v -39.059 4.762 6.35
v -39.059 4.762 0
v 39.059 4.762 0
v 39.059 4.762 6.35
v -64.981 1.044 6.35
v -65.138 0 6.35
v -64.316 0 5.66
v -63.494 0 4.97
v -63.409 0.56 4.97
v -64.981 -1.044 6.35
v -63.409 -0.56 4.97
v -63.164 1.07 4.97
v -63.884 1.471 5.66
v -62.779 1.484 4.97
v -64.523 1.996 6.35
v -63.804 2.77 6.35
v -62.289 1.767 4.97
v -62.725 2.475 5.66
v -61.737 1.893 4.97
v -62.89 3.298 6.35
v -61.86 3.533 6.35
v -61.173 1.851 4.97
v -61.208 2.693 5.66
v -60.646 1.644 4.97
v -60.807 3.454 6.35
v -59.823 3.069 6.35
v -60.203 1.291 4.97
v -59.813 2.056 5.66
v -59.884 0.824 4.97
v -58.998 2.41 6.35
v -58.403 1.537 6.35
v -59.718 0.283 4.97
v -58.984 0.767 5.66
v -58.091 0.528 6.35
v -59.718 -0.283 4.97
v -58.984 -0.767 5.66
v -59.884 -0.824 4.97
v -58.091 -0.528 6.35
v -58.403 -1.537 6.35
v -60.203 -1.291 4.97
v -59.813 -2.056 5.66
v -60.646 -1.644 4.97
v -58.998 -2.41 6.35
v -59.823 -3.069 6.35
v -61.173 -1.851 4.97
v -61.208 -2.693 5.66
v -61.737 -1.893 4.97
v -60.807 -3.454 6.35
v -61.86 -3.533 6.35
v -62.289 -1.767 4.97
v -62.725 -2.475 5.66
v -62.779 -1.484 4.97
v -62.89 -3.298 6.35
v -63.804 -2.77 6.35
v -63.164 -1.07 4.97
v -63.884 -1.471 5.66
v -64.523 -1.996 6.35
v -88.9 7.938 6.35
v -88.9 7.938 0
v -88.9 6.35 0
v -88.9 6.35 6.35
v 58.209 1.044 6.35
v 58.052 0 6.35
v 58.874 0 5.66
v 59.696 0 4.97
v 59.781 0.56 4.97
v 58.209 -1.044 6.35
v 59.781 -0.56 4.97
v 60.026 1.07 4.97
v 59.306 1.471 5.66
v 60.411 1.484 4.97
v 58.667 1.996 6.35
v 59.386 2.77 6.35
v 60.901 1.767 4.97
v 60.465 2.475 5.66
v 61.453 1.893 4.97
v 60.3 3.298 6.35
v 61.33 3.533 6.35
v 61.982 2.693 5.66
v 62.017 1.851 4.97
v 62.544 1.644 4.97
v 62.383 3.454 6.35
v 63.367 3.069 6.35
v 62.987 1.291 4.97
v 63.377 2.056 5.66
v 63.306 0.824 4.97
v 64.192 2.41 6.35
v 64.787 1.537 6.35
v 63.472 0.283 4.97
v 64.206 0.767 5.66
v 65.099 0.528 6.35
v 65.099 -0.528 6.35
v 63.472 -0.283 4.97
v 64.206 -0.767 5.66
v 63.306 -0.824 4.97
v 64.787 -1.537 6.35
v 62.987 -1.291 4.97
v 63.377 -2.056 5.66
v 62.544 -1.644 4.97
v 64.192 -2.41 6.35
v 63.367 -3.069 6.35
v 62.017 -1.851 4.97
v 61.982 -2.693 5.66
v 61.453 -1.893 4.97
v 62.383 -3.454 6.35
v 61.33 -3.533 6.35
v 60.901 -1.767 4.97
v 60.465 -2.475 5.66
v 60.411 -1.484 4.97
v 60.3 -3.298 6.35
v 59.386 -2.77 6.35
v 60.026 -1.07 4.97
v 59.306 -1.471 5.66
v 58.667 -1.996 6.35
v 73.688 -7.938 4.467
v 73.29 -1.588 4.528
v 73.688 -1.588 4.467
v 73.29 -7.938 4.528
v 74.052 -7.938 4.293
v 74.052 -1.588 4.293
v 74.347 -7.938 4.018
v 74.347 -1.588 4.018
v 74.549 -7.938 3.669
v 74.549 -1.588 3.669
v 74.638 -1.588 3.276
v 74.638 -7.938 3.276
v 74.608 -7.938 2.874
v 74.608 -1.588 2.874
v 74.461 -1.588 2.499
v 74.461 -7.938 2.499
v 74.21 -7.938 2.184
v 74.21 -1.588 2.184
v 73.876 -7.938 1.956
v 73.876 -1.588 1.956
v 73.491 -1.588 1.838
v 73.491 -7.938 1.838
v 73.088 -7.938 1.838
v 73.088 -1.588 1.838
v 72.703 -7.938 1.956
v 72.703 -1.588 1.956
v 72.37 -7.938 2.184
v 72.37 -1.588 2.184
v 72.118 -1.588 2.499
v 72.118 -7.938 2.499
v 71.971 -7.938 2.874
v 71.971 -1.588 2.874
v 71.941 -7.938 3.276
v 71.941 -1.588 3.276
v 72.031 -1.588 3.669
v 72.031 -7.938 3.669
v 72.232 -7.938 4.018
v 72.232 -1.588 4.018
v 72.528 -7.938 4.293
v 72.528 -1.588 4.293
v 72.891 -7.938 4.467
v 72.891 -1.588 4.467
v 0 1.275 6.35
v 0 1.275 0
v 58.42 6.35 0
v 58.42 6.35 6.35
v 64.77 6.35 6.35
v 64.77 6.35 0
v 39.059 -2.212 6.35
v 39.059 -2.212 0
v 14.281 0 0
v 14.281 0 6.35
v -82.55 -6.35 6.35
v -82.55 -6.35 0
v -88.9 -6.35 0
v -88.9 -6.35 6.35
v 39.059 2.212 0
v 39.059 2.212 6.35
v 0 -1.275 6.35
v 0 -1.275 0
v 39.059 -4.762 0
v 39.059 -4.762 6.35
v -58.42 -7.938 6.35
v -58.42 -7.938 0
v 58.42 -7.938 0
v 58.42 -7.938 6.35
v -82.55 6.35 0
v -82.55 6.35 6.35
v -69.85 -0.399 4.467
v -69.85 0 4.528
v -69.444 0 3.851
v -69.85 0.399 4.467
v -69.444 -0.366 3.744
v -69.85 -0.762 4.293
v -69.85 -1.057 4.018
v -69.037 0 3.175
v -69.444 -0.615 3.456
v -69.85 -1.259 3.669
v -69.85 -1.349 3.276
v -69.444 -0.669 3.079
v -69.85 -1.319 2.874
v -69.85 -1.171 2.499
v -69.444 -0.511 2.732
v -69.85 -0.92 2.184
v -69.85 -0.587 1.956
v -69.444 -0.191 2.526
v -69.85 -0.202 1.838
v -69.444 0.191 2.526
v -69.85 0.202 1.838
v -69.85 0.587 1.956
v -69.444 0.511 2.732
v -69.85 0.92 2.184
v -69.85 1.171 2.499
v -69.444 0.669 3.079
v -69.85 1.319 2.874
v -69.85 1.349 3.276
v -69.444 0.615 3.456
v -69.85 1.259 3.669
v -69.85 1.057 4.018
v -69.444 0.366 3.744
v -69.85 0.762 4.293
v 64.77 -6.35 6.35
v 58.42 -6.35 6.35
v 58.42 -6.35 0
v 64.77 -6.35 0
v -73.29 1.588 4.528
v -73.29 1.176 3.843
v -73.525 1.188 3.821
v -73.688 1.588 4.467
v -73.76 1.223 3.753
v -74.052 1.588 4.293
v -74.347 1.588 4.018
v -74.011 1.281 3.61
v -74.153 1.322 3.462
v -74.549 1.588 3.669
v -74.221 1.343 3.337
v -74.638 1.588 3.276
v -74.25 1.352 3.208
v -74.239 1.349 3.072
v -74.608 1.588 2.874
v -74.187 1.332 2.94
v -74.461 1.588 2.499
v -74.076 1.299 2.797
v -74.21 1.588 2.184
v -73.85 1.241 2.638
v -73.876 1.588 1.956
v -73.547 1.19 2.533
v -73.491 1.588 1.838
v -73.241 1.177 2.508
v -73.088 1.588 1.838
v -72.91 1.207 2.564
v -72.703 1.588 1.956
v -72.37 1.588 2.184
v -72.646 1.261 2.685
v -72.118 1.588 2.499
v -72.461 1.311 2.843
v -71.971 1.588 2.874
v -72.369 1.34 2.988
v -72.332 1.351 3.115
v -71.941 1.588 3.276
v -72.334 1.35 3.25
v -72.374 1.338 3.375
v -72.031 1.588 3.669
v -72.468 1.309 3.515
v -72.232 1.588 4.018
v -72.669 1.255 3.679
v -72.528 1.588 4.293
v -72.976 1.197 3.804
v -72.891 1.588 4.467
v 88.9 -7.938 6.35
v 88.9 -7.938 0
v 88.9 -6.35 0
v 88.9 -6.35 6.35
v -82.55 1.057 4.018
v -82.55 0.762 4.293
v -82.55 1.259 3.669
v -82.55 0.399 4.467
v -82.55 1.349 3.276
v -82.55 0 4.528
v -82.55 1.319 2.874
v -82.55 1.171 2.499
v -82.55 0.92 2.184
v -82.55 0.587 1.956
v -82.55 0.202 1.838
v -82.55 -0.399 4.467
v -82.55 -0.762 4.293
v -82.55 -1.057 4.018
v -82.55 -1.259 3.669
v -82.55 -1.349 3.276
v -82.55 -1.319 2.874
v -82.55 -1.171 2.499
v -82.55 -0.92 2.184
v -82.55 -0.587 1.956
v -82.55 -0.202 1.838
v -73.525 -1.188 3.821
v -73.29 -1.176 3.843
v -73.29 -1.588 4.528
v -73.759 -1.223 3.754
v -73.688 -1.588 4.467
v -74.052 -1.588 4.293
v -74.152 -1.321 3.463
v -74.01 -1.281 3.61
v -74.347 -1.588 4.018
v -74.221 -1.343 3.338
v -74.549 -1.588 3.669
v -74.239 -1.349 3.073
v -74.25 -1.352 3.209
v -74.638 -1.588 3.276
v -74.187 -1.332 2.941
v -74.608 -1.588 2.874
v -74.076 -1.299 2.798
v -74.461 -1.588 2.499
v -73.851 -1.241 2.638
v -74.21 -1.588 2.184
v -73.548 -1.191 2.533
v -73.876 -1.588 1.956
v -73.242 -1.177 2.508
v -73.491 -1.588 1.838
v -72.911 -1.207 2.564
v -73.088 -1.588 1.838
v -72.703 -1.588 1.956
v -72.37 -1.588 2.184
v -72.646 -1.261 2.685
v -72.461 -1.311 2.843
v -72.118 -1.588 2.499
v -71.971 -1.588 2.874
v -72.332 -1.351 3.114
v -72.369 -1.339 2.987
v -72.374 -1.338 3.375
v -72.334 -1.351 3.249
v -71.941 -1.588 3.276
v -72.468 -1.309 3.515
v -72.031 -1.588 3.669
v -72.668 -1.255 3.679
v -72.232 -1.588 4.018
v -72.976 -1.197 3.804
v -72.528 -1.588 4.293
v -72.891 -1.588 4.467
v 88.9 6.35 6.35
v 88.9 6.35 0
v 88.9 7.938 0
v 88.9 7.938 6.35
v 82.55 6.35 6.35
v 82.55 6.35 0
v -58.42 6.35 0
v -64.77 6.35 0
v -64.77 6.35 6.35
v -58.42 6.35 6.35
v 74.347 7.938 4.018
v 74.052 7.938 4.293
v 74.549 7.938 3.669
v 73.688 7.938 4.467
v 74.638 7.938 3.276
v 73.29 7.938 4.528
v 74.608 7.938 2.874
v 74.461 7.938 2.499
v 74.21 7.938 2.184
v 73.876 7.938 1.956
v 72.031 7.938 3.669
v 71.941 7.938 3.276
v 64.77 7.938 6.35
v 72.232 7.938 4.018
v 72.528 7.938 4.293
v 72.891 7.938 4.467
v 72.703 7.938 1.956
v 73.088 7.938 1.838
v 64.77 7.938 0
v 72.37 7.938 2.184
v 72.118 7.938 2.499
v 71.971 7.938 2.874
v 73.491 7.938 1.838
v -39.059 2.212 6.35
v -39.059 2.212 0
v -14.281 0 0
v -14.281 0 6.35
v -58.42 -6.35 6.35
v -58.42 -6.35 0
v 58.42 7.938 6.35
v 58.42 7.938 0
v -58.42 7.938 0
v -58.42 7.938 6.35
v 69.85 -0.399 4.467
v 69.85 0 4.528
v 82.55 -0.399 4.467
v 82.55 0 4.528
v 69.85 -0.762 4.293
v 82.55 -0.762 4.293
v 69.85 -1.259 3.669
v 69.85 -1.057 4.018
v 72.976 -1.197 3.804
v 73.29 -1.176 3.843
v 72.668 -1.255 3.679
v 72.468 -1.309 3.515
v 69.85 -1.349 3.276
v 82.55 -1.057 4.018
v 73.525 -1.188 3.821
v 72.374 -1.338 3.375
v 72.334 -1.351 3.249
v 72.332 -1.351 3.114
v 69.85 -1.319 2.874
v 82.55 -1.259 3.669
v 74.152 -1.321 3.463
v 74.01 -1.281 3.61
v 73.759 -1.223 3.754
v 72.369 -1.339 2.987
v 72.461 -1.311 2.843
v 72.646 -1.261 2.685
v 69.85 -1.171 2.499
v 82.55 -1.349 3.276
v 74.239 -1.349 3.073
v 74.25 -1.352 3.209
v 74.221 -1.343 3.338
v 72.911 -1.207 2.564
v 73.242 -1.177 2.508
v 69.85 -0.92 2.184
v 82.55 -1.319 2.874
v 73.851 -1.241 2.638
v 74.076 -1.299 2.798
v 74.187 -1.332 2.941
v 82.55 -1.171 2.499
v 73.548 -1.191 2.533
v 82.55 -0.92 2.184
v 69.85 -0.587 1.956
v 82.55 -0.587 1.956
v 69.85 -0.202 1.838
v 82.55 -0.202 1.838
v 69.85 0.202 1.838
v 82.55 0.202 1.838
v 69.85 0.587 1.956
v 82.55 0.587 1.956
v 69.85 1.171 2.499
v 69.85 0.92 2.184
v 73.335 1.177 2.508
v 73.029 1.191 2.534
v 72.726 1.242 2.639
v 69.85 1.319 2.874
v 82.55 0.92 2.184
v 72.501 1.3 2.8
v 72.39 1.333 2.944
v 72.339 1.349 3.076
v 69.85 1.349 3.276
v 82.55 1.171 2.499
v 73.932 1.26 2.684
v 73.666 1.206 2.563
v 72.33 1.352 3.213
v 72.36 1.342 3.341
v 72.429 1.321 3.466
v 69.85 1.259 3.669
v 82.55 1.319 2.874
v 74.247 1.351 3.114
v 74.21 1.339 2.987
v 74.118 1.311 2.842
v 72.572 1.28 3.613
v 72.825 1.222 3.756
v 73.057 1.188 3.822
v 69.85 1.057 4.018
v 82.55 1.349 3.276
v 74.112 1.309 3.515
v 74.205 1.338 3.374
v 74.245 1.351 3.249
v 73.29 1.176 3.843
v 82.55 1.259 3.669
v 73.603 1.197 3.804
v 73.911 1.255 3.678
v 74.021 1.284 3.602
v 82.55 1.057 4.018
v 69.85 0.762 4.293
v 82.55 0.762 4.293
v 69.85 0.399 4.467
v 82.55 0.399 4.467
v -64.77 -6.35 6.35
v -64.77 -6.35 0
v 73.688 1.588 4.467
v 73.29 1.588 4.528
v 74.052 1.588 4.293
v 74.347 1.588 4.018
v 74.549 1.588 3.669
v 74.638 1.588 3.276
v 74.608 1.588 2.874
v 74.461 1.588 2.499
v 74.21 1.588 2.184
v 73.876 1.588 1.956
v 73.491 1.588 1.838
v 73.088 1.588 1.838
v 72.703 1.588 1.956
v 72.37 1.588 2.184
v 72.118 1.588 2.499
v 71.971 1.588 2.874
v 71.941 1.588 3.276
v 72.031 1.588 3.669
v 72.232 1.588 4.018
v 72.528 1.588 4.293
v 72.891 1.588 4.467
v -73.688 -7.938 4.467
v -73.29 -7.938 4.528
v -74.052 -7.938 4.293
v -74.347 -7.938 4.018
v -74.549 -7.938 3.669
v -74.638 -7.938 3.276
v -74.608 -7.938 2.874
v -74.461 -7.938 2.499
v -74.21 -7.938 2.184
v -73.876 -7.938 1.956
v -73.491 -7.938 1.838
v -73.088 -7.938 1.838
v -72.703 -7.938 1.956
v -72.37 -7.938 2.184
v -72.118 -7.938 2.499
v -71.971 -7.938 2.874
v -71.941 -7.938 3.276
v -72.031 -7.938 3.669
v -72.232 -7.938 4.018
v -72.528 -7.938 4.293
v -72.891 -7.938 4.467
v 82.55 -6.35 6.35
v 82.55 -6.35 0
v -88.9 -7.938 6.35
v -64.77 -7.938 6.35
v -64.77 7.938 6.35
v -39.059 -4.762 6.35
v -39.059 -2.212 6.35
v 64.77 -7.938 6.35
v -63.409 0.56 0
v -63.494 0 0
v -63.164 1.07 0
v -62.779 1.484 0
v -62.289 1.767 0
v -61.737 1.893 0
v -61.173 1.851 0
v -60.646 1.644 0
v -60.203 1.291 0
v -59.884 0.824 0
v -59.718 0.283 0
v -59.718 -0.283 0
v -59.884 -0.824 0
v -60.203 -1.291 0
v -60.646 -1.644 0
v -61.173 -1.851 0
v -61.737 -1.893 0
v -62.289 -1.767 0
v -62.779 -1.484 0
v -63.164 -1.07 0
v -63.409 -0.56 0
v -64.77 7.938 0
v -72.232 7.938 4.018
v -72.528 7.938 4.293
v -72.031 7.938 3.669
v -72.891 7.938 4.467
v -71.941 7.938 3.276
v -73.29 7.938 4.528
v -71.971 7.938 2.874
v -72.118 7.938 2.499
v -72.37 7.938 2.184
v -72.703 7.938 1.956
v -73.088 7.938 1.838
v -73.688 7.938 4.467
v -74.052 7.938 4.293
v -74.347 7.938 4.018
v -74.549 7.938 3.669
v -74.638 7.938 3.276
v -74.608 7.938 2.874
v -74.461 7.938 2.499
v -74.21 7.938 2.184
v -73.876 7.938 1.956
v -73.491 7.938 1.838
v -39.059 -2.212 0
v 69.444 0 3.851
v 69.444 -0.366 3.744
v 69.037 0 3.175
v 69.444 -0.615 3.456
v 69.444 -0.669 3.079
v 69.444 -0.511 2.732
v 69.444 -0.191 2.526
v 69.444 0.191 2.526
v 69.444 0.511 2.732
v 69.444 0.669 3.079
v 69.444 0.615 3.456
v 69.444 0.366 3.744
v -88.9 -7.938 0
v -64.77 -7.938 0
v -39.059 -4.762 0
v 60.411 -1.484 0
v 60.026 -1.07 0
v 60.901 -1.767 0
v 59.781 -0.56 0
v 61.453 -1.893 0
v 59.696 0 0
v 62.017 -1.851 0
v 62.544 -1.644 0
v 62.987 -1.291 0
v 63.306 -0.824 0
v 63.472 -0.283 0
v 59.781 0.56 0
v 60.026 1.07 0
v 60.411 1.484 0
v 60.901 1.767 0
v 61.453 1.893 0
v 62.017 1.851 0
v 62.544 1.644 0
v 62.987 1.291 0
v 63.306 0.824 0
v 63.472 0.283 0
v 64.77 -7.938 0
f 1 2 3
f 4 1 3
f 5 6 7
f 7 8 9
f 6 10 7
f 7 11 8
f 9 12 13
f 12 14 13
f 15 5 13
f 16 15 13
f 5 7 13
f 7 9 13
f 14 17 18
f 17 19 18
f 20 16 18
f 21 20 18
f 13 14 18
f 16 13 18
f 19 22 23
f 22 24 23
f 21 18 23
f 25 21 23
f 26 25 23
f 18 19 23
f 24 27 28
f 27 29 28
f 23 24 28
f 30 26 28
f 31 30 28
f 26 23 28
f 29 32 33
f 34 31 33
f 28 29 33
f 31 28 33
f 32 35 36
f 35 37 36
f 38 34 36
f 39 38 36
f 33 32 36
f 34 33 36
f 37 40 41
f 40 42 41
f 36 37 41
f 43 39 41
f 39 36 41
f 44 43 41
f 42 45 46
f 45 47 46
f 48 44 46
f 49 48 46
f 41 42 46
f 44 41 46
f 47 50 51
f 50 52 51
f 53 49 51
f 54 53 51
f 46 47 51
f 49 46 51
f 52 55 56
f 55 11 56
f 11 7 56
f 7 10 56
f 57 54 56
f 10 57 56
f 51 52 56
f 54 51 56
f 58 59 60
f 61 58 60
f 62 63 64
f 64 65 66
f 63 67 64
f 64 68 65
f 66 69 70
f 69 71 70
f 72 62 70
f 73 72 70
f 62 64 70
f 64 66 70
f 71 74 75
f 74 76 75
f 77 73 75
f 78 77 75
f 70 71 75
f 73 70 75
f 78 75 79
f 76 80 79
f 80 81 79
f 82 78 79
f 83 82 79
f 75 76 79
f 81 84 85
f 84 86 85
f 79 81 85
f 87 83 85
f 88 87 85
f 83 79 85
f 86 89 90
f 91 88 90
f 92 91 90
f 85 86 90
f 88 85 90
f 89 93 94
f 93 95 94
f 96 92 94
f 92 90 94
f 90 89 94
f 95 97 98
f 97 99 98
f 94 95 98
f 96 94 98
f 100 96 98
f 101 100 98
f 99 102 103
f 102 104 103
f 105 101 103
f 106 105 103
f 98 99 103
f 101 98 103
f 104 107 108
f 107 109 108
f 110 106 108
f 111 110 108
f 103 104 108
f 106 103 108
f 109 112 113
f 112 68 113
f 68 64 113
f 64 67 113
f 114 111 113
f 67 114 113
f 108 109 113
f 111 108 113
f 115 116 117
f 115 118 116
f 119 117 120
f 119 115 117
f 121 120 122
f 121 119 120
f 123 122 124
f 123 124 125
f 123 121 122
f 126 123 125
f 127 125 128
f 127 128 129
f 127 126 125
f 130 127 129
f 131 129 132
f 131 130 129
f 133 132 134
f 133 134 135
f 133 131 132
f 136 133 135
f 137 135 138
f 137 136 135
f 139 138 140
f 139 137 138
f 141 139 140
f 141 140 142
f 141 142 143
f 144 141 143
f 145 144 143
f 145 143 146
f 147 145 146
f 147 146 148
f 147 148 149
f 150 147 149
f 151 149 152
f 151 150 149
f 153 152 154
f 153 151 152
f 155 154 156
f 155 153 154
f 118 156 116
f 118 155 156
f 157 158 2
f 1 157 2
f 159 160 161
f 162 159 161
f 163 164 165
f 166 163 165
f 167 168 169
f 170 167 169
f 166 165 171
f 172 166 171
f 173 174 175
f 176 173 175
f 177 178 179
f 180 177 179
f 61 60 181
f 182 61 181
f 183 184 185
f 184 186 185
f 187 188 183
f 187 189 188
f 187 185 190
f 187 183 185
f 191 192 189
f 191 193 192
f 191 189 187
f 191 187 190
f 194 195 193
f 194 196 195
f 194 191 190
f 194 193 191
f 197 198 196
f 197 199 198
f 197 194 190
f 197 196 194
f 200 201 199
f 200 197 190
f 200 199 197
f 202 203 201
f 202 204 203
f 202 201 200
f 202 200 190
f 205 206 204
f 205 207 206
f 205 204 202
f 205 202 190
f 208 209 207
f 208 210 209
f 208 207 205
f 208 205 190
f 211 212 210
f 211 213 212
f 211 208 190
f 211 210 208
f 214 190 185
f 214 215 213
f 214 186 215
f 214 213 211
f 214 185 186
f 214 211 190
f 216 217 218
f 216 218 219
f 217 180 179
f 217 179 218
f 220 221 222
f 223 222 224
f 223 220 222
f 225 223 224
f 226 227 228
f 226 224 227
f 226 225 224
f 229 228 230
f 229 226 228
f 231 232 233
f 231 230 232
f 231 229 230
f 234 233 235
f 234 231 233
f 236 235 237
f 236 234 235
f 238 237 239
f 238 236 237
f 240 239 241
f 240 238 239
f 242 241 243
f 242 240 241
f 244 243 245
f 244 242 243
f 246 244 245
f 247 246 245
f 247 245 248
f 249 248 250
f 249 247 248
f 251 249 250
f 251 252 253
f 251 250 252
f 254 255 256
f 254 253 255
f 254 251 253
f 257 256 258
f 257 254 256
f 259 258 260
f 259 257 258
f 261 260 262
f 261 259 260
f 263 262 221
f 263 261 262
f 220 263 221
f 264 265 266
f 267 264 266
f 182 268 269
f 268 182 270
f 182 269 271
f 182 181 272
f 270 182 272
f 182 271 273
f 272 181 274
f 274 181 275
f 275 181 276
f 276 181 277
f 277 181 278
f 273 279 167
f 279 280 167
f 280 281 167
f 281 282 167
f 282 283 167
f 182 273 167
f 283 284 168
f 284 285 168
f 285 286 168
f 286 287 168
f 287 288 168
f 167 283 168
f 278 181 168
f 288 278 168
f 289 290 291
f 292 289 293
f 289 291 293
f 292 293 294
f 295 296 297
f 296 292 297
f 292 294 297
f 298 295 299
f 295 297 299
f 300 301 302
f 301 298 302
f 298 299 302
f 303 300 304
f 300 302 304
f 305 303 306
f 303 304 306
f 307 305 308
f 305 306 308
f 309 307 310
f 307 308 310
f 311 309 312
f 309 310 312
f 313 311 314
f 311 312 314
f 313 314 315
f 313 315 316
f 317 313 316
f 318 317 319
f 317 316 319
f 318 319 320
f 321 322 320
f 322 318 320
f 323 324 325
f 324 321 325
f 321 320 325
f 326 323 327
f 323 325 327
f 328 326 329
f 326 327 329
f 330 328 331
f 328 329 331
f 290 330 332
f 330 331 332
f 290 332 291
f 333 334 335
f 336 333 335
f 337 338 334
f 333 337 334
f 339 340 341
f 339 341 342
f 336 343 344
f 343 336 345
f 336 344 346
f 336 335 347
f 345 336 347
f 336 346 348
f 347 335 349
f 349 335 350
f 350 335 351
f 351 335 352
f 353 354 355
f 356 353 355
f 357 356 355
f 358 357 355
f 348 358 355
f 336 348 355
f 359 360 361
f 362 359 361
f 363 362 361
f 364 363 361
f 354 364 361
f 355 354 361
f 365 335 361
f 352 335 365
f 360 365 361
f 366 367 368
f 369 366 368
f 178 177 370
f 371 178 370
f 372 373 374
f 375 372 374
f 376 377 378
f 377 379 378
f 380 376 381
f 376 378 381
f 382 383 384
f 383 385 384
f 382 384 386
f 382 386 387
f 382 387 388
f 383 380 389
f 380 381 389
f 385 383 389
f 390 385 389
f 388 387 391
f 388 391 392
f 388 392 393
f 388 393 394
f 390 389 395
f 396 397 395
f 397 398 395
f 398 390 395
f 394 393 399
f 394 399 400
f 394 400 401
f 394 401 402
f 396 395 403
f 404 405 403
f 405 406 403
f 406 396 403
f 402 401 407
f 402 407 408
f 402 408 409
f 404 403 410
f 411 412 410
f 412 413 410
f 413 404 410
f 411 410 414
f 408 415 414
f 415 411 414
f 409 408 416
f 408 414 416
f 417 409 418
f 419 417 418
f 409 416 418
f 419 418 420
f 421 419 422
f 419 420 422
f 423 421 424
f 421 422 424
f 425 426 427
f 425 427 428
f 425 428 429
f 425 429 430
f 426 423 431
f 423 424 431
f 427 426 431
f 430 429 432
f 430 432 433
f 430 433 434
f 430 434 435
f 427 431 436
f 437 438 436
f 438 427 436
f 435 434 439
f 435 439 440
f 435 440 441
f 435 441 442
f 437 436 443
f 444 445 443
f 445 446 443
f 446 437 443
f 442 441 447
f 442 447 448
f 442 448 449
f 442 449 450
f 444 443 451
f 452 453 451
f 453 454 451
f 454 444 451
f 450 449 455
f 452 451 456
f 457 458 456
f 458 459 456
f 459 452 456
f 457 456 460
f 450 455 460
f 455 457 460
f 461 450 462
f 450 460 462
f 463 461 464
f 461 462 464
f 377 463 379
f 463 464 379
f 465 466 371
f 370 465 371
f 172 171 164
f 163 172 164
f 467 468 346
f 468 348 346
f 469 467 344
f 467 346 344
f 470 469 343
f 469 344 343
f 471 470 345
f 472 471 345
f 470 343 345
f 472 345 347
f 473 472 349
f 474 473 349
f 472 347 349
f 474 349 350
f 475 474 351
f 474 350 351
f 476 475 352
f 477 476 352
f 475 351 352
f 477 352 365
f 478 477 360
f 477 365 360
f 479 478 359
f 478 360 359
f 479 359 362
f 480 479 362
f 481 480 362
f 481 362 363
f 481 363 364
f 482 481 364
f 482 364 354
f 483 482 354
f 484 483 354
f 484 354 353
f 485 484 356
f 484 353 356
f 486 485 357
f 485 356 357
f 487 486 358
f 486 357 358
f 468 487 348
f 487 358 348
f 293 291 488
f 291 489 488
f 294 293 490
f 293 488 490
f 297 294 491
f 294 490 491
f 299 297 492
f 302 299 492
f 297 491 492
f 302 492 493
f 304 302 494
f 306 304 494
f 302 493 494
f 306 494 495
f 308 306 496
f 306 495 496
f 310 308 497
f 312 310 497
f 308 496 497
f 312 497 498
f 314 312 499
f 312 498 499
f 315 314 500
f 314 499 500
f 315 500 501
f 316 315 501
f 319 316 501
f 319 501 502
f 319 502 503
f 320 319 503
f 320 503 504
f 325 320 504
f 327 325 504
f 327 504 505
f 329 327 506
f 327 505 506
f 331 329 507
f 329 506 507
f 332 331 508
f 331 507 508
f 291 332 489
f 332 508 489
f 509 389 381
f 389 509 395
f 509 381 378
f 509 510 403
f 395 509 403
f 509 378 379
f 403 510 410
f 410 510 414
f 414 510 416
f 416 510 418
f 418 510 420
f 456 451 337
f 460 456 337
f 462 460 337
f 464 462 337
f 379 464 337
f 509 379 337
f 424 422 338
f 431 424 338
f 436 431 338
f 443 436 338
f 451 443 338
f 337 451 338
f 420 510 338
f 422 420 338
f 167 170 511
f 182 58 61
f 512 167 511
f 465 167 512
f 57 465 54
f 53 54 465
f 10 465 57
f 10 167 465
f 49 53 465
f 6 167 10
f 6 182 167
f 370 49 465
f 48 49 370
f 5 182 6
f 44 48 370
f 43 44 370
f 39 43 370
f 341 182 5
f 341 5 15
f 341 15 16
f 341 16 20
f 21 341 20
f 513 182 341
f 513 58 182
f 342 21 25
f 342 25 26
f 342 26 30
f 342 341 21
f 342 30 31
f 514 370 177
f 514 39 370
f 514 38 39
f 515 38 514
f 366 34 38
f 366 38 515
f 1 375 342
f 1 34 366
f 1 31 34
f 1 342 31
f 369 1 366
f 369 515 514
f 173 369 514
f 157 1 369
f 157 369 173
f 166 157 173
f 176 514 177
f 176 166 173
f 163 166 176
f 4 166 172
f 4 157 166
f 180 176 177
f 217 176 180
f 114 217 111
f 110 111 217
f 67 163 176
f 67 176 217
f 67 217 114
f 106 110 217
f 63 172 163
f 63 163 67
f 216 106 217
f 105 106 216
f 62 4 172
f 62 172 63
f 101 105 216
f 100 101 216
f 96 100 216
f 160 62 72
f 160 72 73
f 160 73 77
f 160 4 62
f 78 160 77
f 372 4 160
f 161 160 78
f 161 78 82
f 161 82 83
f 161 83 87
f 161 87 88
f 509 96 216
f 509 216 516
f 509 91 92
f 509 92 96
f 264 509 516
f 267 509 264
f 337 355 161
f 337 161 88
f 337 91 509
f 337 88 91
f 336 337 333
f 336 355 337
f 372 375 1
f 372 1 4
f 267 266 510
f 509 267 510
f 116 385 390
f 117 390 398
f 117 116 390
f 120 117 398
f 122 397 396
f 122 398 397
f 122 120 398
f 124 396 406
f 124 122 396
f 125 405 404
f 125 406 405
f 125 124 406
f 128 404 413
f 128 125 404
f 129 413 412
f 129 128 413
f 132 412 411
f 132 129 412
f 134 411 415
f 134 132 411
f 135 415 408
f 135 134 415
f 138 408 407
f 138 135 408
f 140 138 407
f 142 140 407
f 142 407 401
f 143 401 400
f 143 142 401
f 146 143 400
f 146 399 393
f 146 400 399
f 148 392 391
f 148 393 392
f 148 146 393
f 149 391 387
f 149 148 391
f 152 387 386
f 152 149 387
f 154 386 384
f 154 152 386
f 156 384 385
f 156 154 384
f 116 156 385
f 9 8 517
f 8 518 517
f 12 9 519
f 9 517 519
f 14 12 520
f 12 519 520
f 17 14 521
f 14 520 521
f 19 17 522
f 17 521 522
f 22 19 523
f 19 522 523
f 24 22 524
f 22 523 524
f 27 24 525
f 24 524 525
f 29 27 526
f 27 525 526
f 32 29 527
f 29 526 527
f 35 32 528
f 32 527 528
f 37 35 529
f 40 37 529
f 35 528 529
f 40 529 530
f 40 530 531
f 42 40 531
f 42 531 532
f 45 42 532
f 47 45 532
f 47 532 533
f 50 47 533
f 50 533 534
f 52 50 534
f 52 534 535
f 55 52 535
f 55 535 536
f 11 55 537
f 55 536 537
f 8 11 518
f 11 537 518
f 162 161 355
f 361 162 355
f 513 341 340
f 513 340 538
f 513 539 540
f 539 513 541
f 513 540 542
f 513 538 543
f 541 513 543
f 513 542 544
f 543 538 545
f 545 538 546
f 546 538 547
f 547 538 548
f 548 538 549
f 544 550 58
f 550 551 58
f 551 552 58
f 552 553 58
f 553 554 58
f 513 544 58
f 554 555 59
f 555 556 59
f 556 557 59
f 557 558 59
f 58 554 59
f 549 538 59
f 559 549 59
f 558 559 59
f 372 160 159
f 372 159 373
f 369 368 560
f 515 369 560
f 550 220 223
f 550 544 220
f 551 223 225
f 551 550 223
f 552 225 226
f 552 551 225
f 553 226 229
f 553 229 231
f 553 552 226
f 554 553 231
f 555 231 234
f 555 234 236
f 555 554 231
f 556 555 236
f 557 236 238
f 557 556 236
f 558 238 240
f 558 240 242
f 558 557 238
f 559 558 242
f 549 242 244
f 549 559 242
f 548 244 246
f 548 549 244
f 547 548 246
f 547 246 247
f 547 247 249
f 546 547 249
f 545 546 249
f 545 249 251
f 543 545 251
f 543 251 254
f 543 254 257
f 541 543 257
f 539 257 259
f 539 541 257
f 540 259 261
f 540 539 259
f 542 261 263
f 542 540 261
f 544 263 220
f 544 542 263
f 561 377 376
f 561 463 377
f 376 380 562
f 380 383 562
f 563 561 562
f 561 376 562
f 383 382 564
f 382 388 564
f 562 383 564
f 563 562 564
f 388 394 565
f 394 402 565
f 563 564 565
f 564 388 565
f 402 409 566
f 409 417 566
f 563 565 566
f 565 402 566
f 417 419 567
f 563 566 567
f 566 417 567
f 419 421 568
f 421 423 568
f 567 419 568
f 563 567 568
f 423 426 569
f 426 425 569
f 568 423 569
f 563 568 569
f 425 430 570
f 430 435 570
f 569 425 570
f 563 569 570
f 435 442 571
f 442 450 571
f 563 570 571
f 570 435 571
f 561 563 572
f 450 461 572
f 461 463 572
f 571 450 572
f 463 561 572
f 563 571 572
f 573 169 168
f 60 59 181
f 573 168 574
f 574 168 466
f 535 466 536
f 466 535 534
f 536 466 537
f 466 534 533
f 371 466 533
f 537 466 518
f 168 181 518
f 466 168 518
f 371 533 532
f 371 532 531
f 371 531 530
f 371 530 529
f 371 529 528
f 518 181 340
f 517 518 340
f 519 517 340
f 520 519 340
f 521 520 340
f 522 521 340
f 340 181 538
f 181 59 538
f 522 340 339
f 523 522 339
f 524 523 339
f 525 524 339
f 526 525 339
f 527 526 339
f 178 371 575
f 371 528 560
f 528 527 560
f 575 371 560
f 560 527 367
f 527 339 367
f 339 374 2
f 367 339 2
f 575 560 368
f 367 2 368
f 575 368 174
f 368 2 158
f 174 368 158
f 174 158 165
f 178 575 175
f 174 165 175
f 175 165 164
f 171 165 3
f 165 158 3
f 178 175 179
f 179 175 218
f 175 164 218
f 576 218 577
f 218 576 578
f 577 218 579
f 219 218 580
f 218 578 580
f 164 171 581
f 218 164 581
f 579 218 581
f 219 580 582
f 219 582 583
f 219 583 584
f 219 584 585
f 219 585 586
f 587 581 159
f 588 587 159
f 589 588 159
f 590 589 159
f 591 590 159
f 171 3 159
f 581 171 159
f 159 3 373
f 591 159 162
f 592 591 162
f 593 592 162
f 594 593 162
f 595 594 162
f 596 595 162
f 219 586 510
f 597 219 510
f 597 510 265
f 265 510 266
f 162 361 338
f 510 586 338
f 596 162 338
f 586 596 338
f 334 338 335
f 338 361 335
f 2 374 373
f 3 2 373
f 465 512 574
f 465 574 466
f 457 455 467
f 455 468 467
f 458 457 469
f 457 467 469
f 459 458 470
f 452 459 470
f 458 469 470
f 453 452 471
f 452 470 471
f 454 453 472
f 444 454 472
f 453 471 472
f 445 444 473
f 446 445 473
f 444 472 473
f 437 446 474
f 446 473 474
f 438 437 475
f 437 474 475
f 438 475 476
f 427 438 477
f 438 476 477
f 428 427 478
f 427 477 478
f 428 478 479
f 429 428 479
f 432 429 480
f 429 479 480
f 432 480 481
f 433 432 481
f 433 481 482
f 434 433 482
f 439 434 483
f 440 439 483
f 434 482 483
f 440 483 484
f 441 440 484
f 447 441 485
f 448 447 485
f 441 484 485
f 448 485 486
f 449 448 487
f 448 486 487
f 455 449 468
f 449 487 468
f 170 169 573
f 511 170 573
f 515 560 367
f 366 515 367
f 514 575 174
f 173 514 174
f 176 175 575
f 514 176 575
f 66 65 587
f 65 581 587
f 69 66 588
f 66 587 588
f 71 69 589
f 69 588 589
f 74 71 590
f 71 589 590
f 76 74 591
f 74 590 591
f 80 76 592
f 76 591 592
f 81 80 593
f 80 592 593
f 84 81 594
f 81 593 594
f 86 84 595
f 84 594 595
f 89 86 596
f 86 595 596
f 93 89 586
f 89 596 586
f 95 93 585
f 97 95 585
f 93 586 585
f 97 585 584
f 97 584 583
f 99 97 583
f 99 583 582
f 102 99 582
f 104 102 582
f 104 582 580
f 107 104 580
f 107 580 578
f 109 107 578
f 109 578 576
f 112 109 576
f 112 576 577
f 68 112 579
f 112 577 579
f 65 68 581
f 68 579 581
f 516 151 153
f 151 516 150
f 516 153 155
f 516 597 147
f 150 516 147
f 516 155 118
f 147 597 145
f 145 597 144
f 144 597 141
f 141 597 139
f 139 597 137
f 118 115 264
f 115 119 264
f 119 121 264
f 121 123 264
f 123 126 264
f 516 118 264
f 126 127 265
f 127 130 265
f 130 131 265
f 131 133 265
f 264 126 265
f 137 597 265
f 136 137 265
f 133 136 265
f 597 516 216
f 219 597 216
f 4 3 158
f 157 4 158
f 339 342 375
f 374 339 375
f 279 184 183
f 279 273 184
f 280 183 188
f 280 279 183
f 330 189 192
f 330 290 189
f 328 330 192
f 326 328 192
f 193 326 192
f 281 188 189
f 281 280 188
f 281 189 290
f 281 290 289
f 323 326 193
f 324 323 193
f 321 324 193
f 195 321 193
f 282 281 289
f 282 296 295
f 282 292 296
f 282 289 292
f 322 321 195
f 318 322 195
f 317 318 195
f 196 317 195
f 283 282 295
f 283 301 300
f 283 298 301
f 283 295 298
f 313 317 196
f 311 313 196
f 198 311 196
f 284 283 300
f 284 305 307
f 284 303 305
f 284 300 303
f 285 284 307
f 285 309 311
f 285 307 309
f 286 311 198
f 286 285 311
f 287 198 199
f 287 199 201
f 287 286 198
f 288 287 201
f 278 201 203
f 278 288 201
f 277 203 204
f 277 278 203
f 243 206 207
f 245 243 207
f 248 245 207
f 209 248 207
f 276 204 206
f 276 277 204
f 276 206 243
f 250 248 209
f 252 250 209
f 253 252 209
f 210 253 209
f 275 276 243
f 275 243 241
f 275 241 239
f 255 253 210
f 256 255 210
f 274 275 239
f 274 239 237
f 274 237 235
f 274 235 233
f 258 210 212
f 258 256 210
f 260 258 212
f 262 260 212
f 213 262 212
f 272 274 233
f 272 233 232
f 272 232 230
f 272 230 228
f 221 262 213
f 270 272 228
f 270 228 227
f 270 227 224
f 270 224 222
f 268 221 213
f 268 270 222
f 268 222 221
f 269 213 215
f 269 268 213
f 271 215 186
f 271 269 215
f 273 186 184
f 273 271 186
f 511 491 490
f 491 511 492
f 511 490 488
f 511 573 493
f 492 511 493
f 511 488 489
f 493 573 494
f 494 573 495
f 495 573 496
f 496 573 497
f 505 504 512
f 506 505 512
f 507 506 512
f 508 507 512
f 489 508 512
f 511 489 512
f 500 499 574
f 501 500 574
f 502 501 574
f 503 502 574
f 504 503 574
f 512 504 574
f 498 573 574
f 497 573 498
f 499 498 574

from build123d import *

# Parameters (mm, degrees)
BOSS_EXTRUDE1_DEPTH                               = 6.35
SKETCH7_W                                         = 6.35
SKETCH7_H                                         = 1.5875
CUT_EXTRUDE1_DEPTH                                = 90.479251261
CSK_FOR_6_FLAT_HEAD_MACHINE_SCREW_100_D           = 3.7973
CSK_FOR_6_FLAT_HEAD_MACHINE_SCREW_100_CSINK_D     = 7.0866
CSK_FOR_6_FLAT_HEAD_MACHINE_SCREW_100_CSINK_ANGLE = 100


with BuildPart() as part:
    # Sketch1 → Boss-Extrude1 (new body)
    with BuildSketch(Plane.XY):
        Polygon((-39.059416118, -2.212395735), (-39.059416118, 2.212395735), (-82.55, 6.095483582), (-82.55, -6.095483582), align=None)
        Polygon((39.059416118, -4.7625), (-39.059416118, -4.7625), (-74.619416118, -7.9375), (74.619416118, -7.9375), align=None)
        Polygon((-39.059416118, -4.7625), (-39.059416118, -2.212395735), (-82.55, -6.095483582), (-82.55, -6.35), (-85.400583882, -6.35), (-88.9, -6.662447868), (-88.9, -7.9375), (-74.619416118, -7.9375), align=None)
        Polygon((0, -1.275052132), (-14.280583882, 0), (-39.059416118, -2.212395735), (-39.059416118, -4.7625), align=None)
        Polygon((0, 1.275052132), (-39.059416118, 4.7625), (-39.059416118, 2.212395735), (-14.280583882, 0), align=None)
        Polygon((74.619416118, 7.9375), (-74.619416118, 7.9375), (-39.059416118, 4.7625), (39.059416118, 4.7625), align=None)
        Polygon((-74.619416118, 7.9375), (-88.9, 7.9375), (-88.9, 6.662447868), (-85.400583882, 6.35), (-82.55, 6.35), (-82.55, 6.095483582), (-39.059416118, 2.212395735), (-39.059416118, 4.7625), align=None)
        Polygon((39.059416118, -2.212395735), (14.280583882, 0), (0, -1.275052132), (39.059416118, -4.7625), align=None)
        Polygon((39.059416118, 2.212395735), (39.059416118, 4.7625), (0, 1.275052132), (14.280583882, 0), align=None)
        Polygon((14.280583882, 0), (0, 1.275052132), (-14.280583882, 0), (0, -1.275052132), align=None)
        Polygon((82.55, -6.095483582), (39.059416118, -2.212395735), (39.059416118, -4.7625), (74.619416118, -7.9375), (88.9, -7.9375), (88.9, -6.662447868), (85.400583882, -6.35), (82.55, -6.35), align=None)
        Polygon((88.9, 7.9375), (74.619416118, 7.9375), (39.059416118, 4.7625), (39.059416118, 2.212395735), (82.55, 6.095483582), (82.55, 6.35), (85.400583882, 6.35), (88.9, 6.662447868), align=None)
        Polygon((88.9, 6.35), (88.9, 6.662447868), (85.400583882, 6.35), align=None)
        Polygon((88.9, -6.35), (85.400583882, -6.35), (88.9, -6.662447868), align=None)
        Polygon((82.55, 6.095483582), (39.059416118, 2.212395735), (39.059416118, -2.212395735), (82.55, -6.095483582), align=None)
        Polygon((-88.9, -6.662447868), (-85.400583882, -6.35), (-88.9, -6.35), align=None)
        Polygon((-85.400583882, 6.35), (-88.9, 6.662447868), (-88.9, 6.35), align=None)
    extrude(amount=BOSS_EXTRUDE1_DEPTH)

    # Sketch4 → Tap Drill for #6-32 Tap1 (revolve, cut)
    with BuildSketch(Plane(origin=(-82.55, 0, 3.175), x_dir=(0, 0, 1), z_dir=(0, 1, 0))):
        Polygon((0, 0), (0, 13.51269403), (1.35255, 12.7), (1.35255, 0), align=None)
    tap_drill_for_6_32_tap1 = revolve(axis=Axis((-88.9, 0, 3.175), (1, 0, 0)), mode=Mode.SUBTRACT)

    # Mirror1: Tap Drill for #6-32 Tap1 across plane
    add(tap_drill_for_6_32_tap1.mirror(Plane(origin=(0, 0, 0), x_dir=(0, 0, 1), z_dir=(1, 0, 0))), mode=Mode.SUBTRACT)

    # Sketch5 → Tap Drill for #6-32 Tap2 (revolve, cut)
    with BuildSketch(Plane(origin=(-73.289583418, 7.9375, 3.175), x_dir=(0, 0, 1), z_dir=(1, 0, 0))):
        Polygon((0, 0), (0, 7.16269403), (1.35255, 6.35), (1.35255, 0), align=None)
    tap_drill_for_6_32_tap2 = revolve(axis=Axis((-73.289583418, 14.2875, 3.175), (0, -1, 0)), mode=Mode.SUBTRACT)

    # Mirror2: Tap Drill for #6-32 Tap2 across plane
    add(tap_drill_for_6_32_tap2.mirror(Plane(origin=(0, 0, 0), x_dir=(0, 0, 1), z_dir=(1, 0, 0))), mode=Mode.SUBTRACT)

    # Mirror3: Tap Drill for #6-32 Tap2 across plane
    add(tap_drill_for_6_32_tap2.mirror(Plane(origin=(0, 0, 0), x_dir=(0, 0, 1), z_dir=(0, -1, 0))), mode=Mode.SUBTRACT)

    # Mirror3 copy 1 sketch → Mirror3 copy 1 (revolve, cut)
    with BuildSketch(Plane(origin=(73.289583418, -7.9375, 3.175), x_dir=(0, 0, 1), z_dir=(-1, 0, 0))):
        Polygon((0, 0), (0, 7.16269403), (1.35255, 6.35), (1.35255, 0), align=None)
    revolve(axis=Axis((73.289583418, -14.2875, 3.175), (0, 1, 0)), mode=Mode.SUBTRACT)

    # Sketch7 → Cut-Extrude1 (cut, through all)
    with BuildSketch(Plane.XY.offset(6.35)):
        with Locations((-61.595, 7.14375)):
            Rectangle(SKETCH7_W, SKETCH7_H)
        with Locations((-61.595, -7.14375)):
            Rectangle(SKETCH7_W, SKETCH7_H)
        with Locations((61.595, -7.14375)):
            Rectangle(SKETCH7_W, SKETCH7_H)
        with Locations((61.595, 7.14375)):
            Rectangle(SKETCH7_W, SKETCH7_H)
    extrude(amount=-CUT_EXTRUDE1_DEPTH, mode=Mode.SUBTRACT)

    # CSK for #6 Flat Head Machine Screw (100)1 (through all)
    with Locations(Plane.XY.offset(6.35)):
        with Locations((-61.595, 0), (61.595, 0)):
            CounterSinkHole(CSK_FOR_6_FLAT_HEAD_MACHINE_SCREW_100_D / 2, CSK_FOR_6_FLAT_HEAD_MACHINE_SCREW_100_CSINK_D / 2, counter_sink_angle=CSK_FOR_6_FLAT_HEAD_MACHINE_SCREW_100_CSINK_ANGLE)


solid = part.part
